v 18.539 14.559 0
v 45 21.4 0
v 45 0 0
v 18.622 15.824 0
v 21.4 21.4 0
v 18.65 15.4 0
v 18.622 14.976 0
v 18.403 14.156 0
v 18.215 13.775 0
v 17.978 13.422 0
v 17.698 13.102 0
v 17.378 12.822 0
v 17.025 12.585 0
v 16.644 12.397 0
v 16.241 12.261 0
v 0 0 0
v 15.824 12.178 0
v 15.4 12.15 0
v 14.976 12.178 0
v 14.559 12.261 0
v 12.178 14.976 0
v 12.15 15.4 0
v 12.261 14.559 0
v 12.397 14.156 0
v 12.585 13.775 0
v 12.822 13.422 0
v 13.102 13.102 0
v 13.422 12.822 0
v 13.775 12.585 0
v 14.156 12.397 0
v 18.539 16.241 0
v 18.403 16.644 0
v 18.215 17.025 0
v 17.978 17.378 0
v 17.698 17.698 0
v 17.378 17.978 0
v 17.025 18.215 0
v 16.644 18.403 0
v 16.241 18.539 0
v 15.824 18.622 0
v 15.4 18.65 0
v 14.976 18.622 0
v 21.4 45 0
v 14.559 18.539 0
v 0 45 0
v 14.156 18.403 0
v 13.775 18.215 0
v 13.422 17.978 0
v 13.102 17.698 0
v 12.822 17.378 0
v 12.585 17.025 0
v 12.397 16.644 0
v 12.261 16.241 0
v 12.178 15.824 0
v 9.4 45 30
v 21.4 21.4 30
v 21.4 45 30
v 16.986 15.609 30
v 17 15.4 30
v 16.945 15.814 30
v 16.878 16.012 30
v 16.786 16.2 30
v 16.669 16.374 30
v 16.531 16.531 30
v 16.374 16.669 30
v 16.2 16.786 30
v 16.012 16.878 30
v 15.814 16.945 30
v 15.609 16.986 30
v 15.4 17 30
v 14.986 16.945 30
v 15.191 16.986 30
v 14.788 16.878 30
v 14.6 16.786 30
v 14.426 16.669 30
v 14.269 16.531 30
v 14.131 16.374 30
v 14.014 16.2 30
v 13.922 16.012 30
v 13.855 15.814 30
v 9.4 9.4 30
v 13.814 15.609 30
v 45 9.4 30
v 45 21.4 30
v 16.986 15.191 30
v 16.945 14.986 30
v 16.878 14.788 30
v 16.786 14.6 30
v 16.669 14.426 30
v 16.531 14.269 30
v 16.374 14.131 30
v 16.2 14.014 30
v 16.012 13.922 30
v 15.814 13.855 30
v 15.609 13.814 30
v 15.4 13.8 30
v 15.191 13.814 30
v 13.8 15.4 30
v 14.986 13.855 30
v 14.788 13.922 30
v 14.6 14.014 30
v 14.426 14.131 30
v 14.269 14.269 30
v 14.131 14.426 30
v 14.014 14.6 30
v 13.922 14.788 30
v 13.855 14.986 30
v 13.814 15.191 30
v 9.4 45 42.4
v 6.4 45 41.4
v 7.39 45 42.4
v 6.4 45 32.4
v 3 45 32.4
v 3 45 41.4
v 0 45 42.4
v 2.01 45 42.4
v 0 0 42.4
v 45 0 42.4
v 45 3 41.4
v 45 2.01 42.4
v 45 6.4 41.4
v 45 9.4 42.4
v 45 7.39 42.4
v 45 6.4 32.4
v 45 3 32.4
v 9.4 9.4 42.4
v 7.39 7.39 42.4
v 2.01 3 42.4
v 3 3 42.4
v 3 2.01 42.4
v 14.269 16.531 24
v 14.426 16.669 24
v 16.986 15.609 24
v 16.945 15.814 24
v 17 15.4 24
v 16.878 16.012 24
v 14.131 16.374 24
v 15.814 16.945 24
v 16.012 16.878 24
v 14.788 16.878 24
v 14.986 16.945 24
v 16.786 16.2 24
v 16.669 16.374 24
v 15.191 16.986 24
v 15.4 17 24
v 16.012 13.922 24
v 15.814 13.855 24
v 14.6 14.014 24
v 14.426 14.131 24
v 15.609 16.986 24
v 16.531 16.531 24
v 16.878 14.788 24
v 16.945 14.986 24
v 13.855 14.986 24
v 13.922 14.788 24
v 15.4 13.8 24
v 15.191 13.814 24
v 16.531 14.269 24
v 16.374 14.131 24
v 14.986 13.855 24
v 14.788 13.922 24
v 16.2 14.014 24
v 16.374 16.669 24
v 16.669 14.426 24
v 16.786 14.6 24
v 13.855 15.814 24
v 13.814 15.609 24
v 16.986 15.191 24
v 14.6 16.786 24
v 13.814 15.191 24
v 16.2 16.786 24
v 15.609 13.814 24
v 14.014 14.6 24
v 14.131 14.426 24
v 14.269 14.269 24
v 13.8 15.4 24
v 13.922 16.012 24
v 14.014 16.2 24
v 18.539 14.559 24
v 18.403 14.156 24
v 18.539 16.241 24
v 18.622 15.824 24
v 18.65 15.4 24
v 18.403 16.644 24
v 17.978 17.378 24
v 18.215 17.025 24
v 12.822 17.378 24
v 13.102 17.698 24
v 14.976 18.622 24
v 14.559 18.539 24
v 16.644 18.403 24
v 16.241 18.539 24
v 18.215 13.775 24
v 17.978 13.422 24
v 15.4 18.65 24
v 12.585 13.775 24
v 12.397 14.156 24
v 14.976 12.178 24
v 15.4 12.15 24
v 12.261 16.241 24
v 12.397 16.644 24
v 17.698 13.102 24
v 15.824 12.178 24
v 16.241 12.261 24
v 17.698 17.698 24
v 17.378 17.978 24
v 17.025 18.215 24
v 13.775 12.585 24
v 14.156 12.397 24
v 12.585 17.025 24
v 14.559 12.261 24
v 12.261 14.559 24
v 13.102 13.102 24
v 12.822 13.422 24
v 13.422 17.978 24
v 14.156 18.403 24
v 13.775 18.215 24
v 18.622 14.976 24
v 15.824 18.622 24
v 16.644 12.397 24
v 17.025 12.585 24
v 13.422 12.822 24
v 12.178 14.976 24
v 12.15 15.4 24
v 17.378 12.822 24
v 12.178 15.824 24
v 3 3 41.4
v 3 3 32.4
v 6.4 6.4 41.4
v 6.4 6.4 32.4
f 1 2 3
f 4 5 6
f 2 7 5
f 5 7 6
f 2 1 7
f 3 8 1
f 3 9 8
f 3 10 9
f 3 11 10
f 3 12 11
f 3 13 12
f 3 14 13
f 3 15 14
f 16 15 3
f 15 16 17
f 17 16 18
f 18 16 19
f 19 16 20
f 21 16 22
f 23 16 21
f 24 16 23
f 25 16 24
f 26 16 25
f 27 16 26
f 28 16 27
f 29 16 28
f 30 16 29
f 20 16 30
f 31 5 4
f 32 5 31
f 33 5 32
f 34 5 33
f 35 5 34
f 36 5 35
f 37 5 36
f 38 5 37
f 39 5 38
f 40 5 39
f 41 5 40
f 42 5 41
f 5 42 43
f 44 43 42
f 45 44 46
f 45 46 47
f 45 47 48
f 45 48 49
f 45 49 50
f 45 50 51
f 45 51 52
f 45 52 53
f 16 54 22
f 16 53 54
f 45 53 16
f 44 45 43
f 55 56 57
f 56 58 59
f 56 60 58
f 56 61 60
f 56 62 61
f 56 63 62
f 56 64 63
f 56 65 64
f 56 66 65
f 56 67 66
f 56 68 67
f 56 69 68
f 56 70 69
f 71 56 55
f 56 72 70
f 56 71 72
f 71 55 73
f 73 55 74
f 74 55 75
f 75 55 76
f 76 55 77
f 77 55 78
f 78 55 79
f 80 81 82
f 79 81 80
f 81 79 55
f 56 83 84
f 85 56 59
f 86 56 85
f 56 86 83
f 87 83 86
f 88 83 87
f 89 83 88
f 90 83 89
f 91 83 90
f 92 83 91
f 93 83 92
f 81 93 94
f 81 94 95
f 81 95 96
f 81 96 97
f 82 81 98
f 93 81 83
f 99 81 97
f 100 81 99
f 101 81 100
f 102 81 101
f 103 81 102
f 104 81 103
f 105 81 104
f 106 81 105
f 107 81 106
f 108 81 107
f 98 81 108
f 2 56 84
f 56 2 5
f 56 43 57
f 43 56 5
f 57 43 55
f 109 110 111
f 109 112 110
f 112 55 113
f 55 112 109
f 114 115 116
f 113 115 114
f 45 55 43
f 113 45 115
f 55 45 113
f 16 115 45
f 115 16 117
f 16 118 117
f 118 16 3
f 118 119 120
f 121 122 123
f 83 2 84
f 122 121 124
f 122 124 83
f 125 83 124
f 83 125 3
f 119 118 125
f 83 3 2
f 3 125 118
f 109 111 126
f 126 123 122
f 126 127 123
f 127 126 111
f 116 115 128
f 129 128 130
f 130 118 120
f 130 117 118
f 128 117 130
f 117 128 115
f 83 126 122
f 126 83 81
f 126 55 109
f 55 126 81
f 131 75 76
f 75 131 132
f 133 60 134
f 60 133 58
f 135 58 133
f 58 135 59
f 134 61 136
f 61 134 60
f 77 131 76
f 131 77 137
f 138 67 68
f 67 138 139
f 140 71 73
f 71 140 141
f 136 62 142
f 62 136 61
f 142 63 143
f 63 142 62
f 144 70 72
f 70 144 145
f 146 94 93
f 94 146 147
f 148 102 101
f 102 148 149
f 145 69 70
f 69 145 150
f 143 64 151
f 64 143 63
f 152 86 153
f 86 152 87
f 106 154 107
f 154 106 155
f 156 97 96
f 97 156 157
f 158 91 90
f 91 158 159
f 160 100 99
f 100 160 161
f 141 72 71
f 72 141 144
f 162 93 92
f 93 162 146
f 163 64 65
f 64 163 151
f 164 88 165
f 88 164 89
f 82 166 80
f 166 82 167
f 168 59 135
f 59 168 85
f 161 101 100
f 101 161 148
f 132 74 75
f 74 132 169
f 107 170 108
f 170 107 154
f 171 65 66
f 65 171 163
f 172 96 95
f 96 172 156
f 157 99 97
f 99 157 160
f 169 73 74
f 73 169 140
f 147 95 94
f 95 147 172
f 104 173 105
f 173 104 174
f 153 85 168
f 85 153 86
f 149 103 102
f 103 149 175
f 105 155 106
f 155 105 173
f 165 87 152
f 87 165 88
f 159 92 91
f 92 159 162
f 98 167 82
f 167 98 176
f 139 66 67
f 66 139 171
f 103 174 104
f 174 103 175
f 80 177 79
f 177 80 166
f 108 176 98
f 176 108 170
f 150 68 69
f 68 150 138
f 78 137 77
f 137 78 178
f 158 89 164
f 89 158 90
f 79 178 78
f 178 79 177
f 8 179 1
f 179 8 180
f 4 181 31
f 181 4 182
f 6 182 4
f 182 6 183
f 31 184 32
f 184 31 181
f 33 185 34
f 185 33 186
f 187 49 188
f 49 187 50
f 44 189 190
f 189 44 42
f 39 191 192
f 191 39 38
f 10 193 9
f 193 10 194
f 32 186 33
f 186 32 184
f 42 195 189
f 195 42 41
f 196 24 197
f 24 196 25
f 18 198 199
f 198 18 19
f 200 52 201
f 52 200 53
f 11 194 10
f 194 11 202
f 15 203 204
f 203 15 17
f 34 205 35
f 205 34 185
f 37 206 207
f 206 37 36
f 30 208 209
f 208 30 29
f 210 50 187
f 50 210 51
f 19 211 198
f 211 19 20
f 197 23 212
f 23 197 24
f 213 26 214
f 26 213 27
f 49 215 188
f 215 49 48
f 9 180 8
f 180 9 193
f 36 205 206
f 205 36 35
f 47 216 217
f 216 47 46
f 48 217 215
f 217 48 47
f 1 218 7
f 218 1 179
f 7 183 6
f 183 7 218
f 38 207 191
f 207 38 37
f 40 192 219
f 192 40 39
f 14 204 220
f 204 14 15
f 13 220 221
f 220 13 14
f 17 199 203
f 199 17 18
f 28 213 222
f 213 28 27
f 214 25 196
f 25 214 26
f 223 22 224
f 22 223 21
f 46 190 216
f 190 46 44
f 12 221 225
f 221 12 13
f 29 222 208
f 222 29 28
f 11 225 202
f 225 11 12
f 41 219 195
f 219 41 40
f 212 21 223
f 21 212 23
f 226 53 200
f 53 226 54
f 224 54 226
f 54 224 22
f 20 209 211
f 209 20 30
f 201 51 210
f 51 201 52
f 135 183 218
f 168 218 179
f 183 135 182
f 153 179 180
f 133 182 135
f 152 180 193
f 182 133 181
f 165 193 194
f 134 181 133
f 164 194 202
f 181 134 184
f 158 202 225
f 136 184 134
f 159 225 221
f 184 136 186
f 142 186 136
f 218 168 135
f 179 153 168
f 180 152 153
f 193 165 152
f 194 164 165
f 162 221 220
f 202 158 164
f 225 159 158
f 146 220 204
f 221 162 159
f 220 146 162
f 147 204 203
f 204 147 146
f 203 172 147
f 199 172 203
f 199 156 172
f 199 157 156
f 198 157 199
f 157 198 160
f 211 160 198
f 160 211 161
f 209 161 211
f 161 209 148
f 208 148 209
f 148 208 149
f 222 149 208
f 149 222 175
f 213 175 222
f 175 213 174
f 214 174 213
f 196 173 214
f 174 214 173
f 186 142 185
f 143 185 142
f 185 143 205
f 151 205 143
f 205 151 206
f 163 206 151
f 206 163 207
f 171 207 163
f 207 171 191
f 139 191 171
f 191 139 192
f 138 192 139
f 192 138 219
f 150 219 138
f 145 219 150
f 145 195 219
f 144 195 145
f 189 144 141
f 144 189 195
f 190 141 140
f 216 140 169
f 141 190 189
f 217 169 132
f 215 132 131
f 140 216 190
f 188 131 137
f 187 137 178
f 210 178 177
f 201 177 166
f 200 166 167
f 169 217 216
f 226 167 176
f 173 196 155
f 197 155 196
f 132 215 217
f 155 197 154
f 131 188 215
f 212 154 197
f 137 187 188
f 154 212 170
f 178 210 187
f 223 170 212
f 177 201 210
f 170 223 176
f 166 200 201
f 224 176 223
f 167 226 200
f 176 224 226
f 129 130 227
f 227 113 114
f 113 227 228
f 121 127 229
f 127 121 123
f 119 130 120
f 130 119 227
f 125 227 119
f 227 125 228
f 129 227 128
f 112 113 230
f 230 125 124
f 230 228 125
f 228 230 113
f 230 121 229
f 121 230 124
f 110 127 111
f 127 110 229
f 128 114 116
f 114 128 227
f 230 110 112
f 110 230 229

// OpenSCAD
// =====================================================================
//  Peça de canto da maquete — pé de 3 cm + apoio da base + encaixe da cúpula
//  Imprimir 4 peças em PLA (são iguais e simétricas — servem nos 4 cantos).
//
//  Ideia:
//    - Embaixo: pé de 30 mm que levanta a base.
//    - Meio: degrau (rebaixo) em L onde o canto da base apoia.
//    - Em cima: canaleta em L onde a parede da cúpula encaixa.
//      A canaleta em 90° força a cúpula a ficar no esquadro.
//
//  Todas as medidas em mm. Ajuste os parâmetros com as medidas reais.
// =====================================================================

/* [Medidas das peças existentes] */
espessura_base    = 3;    // espessura da chapa da base (MDF/acrílico)
espessura_cupula  = 3;    // espessura da parede da cúpula

/* [Folgas para PLA] */
folga_base   = 0.4;       // folga vertical/lateral da base
folga_cupula = 0.4;       // folga total da canaleta (largura = parede + folga)

/* [Geometria da peça] */
altura_pe          = 30;  // pé de 3 cm (do chão até a face de baixo da base)
comprimento_braco  = 45;  // comprimento de cada braço do L
parede_externa     = 3;   // parede de fora da canaleta (acabamento externo)
parede_interna     = 3;   // parede entre a canaleta e a borda da base
largura_apoio_base = 12;  // quanto a base apoia em cima do pé
profundidade_canal = 10;  // quanto a parede da cúpula entra na canaleta
chanfro_canal      = 1;   // chanfro na entrada da canaleta (facilita encaixe)
altura_acima_base  = 9;   // altura das paredes acima da face de cima da base

/* [Furo para parafuso (opcional)] */
usar_furo        = true;
diam_furo        = 3.2;   // M3 / parafuso de madeira 3 mm
diam_cabeca      = 6.5;
carne_furo       = 6;     // material sob a base no furo (o resto é rebaixo por baixo)

$fn = 48;

// ---------- medidas derivadas ----------
largura_canal = espessura_cupula + folga_cupula;
u_canal_ini   = parede_externa;
u_canal_fim   = parede_externa + largura_canal;
u_borda_base  = u_canal_fim + parede_interna;          // onde fica a borda da base
largura_total = u_borda_base + largura_apoio_base;
z_topo        = altura_pe + espessura_base + folga_base + altura_acima_base;
z_fundo_canal = z_topo - profundidade_canal;
A = comprimento_braco;

echo(str("Altura total da peça: ", z_topo, " mm"));
echo(str("Largura da canaleta: ", largura_canal, " mm"));
echo(str("Base recuada da face externa da peça: ", u_borda_base, " mm"));
echo(str("=> Cúpula externa = Base + ", 2*(u_borda_base - u_canal_ini - folga_cupula/2), " mm"));

// região em L com largura w (canto externo na origem)
module L2d(w) {
    union() {
        square([A, w]);
        square([w, A]);
    }
}

// um braço da canaleta (seção com chanfro), correndo ao longo de X
module canal_braco() {
    translate([u_canal_ini, 0, 0])   // começa no canto da canaleta
    rotate([90, 0, 90])
    linear_extrude(A + 1)
    polygon([
        [u_canal_ini,               z_fundo_canal],
        [u_canal_fim,               z_fundo_canal],
        [u_canal_fim,               z_topo - chanfro_canal],
        [u_canal_fim + chanfro_canal, z_topo + 0.01],
        [u_canal_fim + chanfro_canal, z_topo + 1],
        [u_canal_ini - chanfro_canal, z_topo + 1],
        [u_canal_ini - chanfro_canal, z_topo + 0.01],
        [u_canal_ini,               z_topo - chanfro_canal],
    ]);
}

module peca_canto() {
    difference() {
        union() {
            // pé + apoio da base
            linear_extrude(altura_pe) L2d(largura_total);
            // paredes (externa + canaleta + interna) até o topo
            linear_extrude(z_topo) L2d(u_borda_base);
        }
        // canaleta em L (dois braços se cruzando no canto)
        canal_braco();
        mirror([1, -1, 0]) canal_braco();

        // furo de fixação da base (no meio do apoio, na diagonal)
        if (usar_furo) {
            c = u_borda_base + largura_apoio_base / 2;
            translate([c, c, -1]) cylinder(d = diam_furo, h = altura_pe + 2);
            translate([c, c, -1]) cylinder(d = diam_cabeca, h = altura_pe - carne_furo + 1);
        }
    }
}

peca_canto();
